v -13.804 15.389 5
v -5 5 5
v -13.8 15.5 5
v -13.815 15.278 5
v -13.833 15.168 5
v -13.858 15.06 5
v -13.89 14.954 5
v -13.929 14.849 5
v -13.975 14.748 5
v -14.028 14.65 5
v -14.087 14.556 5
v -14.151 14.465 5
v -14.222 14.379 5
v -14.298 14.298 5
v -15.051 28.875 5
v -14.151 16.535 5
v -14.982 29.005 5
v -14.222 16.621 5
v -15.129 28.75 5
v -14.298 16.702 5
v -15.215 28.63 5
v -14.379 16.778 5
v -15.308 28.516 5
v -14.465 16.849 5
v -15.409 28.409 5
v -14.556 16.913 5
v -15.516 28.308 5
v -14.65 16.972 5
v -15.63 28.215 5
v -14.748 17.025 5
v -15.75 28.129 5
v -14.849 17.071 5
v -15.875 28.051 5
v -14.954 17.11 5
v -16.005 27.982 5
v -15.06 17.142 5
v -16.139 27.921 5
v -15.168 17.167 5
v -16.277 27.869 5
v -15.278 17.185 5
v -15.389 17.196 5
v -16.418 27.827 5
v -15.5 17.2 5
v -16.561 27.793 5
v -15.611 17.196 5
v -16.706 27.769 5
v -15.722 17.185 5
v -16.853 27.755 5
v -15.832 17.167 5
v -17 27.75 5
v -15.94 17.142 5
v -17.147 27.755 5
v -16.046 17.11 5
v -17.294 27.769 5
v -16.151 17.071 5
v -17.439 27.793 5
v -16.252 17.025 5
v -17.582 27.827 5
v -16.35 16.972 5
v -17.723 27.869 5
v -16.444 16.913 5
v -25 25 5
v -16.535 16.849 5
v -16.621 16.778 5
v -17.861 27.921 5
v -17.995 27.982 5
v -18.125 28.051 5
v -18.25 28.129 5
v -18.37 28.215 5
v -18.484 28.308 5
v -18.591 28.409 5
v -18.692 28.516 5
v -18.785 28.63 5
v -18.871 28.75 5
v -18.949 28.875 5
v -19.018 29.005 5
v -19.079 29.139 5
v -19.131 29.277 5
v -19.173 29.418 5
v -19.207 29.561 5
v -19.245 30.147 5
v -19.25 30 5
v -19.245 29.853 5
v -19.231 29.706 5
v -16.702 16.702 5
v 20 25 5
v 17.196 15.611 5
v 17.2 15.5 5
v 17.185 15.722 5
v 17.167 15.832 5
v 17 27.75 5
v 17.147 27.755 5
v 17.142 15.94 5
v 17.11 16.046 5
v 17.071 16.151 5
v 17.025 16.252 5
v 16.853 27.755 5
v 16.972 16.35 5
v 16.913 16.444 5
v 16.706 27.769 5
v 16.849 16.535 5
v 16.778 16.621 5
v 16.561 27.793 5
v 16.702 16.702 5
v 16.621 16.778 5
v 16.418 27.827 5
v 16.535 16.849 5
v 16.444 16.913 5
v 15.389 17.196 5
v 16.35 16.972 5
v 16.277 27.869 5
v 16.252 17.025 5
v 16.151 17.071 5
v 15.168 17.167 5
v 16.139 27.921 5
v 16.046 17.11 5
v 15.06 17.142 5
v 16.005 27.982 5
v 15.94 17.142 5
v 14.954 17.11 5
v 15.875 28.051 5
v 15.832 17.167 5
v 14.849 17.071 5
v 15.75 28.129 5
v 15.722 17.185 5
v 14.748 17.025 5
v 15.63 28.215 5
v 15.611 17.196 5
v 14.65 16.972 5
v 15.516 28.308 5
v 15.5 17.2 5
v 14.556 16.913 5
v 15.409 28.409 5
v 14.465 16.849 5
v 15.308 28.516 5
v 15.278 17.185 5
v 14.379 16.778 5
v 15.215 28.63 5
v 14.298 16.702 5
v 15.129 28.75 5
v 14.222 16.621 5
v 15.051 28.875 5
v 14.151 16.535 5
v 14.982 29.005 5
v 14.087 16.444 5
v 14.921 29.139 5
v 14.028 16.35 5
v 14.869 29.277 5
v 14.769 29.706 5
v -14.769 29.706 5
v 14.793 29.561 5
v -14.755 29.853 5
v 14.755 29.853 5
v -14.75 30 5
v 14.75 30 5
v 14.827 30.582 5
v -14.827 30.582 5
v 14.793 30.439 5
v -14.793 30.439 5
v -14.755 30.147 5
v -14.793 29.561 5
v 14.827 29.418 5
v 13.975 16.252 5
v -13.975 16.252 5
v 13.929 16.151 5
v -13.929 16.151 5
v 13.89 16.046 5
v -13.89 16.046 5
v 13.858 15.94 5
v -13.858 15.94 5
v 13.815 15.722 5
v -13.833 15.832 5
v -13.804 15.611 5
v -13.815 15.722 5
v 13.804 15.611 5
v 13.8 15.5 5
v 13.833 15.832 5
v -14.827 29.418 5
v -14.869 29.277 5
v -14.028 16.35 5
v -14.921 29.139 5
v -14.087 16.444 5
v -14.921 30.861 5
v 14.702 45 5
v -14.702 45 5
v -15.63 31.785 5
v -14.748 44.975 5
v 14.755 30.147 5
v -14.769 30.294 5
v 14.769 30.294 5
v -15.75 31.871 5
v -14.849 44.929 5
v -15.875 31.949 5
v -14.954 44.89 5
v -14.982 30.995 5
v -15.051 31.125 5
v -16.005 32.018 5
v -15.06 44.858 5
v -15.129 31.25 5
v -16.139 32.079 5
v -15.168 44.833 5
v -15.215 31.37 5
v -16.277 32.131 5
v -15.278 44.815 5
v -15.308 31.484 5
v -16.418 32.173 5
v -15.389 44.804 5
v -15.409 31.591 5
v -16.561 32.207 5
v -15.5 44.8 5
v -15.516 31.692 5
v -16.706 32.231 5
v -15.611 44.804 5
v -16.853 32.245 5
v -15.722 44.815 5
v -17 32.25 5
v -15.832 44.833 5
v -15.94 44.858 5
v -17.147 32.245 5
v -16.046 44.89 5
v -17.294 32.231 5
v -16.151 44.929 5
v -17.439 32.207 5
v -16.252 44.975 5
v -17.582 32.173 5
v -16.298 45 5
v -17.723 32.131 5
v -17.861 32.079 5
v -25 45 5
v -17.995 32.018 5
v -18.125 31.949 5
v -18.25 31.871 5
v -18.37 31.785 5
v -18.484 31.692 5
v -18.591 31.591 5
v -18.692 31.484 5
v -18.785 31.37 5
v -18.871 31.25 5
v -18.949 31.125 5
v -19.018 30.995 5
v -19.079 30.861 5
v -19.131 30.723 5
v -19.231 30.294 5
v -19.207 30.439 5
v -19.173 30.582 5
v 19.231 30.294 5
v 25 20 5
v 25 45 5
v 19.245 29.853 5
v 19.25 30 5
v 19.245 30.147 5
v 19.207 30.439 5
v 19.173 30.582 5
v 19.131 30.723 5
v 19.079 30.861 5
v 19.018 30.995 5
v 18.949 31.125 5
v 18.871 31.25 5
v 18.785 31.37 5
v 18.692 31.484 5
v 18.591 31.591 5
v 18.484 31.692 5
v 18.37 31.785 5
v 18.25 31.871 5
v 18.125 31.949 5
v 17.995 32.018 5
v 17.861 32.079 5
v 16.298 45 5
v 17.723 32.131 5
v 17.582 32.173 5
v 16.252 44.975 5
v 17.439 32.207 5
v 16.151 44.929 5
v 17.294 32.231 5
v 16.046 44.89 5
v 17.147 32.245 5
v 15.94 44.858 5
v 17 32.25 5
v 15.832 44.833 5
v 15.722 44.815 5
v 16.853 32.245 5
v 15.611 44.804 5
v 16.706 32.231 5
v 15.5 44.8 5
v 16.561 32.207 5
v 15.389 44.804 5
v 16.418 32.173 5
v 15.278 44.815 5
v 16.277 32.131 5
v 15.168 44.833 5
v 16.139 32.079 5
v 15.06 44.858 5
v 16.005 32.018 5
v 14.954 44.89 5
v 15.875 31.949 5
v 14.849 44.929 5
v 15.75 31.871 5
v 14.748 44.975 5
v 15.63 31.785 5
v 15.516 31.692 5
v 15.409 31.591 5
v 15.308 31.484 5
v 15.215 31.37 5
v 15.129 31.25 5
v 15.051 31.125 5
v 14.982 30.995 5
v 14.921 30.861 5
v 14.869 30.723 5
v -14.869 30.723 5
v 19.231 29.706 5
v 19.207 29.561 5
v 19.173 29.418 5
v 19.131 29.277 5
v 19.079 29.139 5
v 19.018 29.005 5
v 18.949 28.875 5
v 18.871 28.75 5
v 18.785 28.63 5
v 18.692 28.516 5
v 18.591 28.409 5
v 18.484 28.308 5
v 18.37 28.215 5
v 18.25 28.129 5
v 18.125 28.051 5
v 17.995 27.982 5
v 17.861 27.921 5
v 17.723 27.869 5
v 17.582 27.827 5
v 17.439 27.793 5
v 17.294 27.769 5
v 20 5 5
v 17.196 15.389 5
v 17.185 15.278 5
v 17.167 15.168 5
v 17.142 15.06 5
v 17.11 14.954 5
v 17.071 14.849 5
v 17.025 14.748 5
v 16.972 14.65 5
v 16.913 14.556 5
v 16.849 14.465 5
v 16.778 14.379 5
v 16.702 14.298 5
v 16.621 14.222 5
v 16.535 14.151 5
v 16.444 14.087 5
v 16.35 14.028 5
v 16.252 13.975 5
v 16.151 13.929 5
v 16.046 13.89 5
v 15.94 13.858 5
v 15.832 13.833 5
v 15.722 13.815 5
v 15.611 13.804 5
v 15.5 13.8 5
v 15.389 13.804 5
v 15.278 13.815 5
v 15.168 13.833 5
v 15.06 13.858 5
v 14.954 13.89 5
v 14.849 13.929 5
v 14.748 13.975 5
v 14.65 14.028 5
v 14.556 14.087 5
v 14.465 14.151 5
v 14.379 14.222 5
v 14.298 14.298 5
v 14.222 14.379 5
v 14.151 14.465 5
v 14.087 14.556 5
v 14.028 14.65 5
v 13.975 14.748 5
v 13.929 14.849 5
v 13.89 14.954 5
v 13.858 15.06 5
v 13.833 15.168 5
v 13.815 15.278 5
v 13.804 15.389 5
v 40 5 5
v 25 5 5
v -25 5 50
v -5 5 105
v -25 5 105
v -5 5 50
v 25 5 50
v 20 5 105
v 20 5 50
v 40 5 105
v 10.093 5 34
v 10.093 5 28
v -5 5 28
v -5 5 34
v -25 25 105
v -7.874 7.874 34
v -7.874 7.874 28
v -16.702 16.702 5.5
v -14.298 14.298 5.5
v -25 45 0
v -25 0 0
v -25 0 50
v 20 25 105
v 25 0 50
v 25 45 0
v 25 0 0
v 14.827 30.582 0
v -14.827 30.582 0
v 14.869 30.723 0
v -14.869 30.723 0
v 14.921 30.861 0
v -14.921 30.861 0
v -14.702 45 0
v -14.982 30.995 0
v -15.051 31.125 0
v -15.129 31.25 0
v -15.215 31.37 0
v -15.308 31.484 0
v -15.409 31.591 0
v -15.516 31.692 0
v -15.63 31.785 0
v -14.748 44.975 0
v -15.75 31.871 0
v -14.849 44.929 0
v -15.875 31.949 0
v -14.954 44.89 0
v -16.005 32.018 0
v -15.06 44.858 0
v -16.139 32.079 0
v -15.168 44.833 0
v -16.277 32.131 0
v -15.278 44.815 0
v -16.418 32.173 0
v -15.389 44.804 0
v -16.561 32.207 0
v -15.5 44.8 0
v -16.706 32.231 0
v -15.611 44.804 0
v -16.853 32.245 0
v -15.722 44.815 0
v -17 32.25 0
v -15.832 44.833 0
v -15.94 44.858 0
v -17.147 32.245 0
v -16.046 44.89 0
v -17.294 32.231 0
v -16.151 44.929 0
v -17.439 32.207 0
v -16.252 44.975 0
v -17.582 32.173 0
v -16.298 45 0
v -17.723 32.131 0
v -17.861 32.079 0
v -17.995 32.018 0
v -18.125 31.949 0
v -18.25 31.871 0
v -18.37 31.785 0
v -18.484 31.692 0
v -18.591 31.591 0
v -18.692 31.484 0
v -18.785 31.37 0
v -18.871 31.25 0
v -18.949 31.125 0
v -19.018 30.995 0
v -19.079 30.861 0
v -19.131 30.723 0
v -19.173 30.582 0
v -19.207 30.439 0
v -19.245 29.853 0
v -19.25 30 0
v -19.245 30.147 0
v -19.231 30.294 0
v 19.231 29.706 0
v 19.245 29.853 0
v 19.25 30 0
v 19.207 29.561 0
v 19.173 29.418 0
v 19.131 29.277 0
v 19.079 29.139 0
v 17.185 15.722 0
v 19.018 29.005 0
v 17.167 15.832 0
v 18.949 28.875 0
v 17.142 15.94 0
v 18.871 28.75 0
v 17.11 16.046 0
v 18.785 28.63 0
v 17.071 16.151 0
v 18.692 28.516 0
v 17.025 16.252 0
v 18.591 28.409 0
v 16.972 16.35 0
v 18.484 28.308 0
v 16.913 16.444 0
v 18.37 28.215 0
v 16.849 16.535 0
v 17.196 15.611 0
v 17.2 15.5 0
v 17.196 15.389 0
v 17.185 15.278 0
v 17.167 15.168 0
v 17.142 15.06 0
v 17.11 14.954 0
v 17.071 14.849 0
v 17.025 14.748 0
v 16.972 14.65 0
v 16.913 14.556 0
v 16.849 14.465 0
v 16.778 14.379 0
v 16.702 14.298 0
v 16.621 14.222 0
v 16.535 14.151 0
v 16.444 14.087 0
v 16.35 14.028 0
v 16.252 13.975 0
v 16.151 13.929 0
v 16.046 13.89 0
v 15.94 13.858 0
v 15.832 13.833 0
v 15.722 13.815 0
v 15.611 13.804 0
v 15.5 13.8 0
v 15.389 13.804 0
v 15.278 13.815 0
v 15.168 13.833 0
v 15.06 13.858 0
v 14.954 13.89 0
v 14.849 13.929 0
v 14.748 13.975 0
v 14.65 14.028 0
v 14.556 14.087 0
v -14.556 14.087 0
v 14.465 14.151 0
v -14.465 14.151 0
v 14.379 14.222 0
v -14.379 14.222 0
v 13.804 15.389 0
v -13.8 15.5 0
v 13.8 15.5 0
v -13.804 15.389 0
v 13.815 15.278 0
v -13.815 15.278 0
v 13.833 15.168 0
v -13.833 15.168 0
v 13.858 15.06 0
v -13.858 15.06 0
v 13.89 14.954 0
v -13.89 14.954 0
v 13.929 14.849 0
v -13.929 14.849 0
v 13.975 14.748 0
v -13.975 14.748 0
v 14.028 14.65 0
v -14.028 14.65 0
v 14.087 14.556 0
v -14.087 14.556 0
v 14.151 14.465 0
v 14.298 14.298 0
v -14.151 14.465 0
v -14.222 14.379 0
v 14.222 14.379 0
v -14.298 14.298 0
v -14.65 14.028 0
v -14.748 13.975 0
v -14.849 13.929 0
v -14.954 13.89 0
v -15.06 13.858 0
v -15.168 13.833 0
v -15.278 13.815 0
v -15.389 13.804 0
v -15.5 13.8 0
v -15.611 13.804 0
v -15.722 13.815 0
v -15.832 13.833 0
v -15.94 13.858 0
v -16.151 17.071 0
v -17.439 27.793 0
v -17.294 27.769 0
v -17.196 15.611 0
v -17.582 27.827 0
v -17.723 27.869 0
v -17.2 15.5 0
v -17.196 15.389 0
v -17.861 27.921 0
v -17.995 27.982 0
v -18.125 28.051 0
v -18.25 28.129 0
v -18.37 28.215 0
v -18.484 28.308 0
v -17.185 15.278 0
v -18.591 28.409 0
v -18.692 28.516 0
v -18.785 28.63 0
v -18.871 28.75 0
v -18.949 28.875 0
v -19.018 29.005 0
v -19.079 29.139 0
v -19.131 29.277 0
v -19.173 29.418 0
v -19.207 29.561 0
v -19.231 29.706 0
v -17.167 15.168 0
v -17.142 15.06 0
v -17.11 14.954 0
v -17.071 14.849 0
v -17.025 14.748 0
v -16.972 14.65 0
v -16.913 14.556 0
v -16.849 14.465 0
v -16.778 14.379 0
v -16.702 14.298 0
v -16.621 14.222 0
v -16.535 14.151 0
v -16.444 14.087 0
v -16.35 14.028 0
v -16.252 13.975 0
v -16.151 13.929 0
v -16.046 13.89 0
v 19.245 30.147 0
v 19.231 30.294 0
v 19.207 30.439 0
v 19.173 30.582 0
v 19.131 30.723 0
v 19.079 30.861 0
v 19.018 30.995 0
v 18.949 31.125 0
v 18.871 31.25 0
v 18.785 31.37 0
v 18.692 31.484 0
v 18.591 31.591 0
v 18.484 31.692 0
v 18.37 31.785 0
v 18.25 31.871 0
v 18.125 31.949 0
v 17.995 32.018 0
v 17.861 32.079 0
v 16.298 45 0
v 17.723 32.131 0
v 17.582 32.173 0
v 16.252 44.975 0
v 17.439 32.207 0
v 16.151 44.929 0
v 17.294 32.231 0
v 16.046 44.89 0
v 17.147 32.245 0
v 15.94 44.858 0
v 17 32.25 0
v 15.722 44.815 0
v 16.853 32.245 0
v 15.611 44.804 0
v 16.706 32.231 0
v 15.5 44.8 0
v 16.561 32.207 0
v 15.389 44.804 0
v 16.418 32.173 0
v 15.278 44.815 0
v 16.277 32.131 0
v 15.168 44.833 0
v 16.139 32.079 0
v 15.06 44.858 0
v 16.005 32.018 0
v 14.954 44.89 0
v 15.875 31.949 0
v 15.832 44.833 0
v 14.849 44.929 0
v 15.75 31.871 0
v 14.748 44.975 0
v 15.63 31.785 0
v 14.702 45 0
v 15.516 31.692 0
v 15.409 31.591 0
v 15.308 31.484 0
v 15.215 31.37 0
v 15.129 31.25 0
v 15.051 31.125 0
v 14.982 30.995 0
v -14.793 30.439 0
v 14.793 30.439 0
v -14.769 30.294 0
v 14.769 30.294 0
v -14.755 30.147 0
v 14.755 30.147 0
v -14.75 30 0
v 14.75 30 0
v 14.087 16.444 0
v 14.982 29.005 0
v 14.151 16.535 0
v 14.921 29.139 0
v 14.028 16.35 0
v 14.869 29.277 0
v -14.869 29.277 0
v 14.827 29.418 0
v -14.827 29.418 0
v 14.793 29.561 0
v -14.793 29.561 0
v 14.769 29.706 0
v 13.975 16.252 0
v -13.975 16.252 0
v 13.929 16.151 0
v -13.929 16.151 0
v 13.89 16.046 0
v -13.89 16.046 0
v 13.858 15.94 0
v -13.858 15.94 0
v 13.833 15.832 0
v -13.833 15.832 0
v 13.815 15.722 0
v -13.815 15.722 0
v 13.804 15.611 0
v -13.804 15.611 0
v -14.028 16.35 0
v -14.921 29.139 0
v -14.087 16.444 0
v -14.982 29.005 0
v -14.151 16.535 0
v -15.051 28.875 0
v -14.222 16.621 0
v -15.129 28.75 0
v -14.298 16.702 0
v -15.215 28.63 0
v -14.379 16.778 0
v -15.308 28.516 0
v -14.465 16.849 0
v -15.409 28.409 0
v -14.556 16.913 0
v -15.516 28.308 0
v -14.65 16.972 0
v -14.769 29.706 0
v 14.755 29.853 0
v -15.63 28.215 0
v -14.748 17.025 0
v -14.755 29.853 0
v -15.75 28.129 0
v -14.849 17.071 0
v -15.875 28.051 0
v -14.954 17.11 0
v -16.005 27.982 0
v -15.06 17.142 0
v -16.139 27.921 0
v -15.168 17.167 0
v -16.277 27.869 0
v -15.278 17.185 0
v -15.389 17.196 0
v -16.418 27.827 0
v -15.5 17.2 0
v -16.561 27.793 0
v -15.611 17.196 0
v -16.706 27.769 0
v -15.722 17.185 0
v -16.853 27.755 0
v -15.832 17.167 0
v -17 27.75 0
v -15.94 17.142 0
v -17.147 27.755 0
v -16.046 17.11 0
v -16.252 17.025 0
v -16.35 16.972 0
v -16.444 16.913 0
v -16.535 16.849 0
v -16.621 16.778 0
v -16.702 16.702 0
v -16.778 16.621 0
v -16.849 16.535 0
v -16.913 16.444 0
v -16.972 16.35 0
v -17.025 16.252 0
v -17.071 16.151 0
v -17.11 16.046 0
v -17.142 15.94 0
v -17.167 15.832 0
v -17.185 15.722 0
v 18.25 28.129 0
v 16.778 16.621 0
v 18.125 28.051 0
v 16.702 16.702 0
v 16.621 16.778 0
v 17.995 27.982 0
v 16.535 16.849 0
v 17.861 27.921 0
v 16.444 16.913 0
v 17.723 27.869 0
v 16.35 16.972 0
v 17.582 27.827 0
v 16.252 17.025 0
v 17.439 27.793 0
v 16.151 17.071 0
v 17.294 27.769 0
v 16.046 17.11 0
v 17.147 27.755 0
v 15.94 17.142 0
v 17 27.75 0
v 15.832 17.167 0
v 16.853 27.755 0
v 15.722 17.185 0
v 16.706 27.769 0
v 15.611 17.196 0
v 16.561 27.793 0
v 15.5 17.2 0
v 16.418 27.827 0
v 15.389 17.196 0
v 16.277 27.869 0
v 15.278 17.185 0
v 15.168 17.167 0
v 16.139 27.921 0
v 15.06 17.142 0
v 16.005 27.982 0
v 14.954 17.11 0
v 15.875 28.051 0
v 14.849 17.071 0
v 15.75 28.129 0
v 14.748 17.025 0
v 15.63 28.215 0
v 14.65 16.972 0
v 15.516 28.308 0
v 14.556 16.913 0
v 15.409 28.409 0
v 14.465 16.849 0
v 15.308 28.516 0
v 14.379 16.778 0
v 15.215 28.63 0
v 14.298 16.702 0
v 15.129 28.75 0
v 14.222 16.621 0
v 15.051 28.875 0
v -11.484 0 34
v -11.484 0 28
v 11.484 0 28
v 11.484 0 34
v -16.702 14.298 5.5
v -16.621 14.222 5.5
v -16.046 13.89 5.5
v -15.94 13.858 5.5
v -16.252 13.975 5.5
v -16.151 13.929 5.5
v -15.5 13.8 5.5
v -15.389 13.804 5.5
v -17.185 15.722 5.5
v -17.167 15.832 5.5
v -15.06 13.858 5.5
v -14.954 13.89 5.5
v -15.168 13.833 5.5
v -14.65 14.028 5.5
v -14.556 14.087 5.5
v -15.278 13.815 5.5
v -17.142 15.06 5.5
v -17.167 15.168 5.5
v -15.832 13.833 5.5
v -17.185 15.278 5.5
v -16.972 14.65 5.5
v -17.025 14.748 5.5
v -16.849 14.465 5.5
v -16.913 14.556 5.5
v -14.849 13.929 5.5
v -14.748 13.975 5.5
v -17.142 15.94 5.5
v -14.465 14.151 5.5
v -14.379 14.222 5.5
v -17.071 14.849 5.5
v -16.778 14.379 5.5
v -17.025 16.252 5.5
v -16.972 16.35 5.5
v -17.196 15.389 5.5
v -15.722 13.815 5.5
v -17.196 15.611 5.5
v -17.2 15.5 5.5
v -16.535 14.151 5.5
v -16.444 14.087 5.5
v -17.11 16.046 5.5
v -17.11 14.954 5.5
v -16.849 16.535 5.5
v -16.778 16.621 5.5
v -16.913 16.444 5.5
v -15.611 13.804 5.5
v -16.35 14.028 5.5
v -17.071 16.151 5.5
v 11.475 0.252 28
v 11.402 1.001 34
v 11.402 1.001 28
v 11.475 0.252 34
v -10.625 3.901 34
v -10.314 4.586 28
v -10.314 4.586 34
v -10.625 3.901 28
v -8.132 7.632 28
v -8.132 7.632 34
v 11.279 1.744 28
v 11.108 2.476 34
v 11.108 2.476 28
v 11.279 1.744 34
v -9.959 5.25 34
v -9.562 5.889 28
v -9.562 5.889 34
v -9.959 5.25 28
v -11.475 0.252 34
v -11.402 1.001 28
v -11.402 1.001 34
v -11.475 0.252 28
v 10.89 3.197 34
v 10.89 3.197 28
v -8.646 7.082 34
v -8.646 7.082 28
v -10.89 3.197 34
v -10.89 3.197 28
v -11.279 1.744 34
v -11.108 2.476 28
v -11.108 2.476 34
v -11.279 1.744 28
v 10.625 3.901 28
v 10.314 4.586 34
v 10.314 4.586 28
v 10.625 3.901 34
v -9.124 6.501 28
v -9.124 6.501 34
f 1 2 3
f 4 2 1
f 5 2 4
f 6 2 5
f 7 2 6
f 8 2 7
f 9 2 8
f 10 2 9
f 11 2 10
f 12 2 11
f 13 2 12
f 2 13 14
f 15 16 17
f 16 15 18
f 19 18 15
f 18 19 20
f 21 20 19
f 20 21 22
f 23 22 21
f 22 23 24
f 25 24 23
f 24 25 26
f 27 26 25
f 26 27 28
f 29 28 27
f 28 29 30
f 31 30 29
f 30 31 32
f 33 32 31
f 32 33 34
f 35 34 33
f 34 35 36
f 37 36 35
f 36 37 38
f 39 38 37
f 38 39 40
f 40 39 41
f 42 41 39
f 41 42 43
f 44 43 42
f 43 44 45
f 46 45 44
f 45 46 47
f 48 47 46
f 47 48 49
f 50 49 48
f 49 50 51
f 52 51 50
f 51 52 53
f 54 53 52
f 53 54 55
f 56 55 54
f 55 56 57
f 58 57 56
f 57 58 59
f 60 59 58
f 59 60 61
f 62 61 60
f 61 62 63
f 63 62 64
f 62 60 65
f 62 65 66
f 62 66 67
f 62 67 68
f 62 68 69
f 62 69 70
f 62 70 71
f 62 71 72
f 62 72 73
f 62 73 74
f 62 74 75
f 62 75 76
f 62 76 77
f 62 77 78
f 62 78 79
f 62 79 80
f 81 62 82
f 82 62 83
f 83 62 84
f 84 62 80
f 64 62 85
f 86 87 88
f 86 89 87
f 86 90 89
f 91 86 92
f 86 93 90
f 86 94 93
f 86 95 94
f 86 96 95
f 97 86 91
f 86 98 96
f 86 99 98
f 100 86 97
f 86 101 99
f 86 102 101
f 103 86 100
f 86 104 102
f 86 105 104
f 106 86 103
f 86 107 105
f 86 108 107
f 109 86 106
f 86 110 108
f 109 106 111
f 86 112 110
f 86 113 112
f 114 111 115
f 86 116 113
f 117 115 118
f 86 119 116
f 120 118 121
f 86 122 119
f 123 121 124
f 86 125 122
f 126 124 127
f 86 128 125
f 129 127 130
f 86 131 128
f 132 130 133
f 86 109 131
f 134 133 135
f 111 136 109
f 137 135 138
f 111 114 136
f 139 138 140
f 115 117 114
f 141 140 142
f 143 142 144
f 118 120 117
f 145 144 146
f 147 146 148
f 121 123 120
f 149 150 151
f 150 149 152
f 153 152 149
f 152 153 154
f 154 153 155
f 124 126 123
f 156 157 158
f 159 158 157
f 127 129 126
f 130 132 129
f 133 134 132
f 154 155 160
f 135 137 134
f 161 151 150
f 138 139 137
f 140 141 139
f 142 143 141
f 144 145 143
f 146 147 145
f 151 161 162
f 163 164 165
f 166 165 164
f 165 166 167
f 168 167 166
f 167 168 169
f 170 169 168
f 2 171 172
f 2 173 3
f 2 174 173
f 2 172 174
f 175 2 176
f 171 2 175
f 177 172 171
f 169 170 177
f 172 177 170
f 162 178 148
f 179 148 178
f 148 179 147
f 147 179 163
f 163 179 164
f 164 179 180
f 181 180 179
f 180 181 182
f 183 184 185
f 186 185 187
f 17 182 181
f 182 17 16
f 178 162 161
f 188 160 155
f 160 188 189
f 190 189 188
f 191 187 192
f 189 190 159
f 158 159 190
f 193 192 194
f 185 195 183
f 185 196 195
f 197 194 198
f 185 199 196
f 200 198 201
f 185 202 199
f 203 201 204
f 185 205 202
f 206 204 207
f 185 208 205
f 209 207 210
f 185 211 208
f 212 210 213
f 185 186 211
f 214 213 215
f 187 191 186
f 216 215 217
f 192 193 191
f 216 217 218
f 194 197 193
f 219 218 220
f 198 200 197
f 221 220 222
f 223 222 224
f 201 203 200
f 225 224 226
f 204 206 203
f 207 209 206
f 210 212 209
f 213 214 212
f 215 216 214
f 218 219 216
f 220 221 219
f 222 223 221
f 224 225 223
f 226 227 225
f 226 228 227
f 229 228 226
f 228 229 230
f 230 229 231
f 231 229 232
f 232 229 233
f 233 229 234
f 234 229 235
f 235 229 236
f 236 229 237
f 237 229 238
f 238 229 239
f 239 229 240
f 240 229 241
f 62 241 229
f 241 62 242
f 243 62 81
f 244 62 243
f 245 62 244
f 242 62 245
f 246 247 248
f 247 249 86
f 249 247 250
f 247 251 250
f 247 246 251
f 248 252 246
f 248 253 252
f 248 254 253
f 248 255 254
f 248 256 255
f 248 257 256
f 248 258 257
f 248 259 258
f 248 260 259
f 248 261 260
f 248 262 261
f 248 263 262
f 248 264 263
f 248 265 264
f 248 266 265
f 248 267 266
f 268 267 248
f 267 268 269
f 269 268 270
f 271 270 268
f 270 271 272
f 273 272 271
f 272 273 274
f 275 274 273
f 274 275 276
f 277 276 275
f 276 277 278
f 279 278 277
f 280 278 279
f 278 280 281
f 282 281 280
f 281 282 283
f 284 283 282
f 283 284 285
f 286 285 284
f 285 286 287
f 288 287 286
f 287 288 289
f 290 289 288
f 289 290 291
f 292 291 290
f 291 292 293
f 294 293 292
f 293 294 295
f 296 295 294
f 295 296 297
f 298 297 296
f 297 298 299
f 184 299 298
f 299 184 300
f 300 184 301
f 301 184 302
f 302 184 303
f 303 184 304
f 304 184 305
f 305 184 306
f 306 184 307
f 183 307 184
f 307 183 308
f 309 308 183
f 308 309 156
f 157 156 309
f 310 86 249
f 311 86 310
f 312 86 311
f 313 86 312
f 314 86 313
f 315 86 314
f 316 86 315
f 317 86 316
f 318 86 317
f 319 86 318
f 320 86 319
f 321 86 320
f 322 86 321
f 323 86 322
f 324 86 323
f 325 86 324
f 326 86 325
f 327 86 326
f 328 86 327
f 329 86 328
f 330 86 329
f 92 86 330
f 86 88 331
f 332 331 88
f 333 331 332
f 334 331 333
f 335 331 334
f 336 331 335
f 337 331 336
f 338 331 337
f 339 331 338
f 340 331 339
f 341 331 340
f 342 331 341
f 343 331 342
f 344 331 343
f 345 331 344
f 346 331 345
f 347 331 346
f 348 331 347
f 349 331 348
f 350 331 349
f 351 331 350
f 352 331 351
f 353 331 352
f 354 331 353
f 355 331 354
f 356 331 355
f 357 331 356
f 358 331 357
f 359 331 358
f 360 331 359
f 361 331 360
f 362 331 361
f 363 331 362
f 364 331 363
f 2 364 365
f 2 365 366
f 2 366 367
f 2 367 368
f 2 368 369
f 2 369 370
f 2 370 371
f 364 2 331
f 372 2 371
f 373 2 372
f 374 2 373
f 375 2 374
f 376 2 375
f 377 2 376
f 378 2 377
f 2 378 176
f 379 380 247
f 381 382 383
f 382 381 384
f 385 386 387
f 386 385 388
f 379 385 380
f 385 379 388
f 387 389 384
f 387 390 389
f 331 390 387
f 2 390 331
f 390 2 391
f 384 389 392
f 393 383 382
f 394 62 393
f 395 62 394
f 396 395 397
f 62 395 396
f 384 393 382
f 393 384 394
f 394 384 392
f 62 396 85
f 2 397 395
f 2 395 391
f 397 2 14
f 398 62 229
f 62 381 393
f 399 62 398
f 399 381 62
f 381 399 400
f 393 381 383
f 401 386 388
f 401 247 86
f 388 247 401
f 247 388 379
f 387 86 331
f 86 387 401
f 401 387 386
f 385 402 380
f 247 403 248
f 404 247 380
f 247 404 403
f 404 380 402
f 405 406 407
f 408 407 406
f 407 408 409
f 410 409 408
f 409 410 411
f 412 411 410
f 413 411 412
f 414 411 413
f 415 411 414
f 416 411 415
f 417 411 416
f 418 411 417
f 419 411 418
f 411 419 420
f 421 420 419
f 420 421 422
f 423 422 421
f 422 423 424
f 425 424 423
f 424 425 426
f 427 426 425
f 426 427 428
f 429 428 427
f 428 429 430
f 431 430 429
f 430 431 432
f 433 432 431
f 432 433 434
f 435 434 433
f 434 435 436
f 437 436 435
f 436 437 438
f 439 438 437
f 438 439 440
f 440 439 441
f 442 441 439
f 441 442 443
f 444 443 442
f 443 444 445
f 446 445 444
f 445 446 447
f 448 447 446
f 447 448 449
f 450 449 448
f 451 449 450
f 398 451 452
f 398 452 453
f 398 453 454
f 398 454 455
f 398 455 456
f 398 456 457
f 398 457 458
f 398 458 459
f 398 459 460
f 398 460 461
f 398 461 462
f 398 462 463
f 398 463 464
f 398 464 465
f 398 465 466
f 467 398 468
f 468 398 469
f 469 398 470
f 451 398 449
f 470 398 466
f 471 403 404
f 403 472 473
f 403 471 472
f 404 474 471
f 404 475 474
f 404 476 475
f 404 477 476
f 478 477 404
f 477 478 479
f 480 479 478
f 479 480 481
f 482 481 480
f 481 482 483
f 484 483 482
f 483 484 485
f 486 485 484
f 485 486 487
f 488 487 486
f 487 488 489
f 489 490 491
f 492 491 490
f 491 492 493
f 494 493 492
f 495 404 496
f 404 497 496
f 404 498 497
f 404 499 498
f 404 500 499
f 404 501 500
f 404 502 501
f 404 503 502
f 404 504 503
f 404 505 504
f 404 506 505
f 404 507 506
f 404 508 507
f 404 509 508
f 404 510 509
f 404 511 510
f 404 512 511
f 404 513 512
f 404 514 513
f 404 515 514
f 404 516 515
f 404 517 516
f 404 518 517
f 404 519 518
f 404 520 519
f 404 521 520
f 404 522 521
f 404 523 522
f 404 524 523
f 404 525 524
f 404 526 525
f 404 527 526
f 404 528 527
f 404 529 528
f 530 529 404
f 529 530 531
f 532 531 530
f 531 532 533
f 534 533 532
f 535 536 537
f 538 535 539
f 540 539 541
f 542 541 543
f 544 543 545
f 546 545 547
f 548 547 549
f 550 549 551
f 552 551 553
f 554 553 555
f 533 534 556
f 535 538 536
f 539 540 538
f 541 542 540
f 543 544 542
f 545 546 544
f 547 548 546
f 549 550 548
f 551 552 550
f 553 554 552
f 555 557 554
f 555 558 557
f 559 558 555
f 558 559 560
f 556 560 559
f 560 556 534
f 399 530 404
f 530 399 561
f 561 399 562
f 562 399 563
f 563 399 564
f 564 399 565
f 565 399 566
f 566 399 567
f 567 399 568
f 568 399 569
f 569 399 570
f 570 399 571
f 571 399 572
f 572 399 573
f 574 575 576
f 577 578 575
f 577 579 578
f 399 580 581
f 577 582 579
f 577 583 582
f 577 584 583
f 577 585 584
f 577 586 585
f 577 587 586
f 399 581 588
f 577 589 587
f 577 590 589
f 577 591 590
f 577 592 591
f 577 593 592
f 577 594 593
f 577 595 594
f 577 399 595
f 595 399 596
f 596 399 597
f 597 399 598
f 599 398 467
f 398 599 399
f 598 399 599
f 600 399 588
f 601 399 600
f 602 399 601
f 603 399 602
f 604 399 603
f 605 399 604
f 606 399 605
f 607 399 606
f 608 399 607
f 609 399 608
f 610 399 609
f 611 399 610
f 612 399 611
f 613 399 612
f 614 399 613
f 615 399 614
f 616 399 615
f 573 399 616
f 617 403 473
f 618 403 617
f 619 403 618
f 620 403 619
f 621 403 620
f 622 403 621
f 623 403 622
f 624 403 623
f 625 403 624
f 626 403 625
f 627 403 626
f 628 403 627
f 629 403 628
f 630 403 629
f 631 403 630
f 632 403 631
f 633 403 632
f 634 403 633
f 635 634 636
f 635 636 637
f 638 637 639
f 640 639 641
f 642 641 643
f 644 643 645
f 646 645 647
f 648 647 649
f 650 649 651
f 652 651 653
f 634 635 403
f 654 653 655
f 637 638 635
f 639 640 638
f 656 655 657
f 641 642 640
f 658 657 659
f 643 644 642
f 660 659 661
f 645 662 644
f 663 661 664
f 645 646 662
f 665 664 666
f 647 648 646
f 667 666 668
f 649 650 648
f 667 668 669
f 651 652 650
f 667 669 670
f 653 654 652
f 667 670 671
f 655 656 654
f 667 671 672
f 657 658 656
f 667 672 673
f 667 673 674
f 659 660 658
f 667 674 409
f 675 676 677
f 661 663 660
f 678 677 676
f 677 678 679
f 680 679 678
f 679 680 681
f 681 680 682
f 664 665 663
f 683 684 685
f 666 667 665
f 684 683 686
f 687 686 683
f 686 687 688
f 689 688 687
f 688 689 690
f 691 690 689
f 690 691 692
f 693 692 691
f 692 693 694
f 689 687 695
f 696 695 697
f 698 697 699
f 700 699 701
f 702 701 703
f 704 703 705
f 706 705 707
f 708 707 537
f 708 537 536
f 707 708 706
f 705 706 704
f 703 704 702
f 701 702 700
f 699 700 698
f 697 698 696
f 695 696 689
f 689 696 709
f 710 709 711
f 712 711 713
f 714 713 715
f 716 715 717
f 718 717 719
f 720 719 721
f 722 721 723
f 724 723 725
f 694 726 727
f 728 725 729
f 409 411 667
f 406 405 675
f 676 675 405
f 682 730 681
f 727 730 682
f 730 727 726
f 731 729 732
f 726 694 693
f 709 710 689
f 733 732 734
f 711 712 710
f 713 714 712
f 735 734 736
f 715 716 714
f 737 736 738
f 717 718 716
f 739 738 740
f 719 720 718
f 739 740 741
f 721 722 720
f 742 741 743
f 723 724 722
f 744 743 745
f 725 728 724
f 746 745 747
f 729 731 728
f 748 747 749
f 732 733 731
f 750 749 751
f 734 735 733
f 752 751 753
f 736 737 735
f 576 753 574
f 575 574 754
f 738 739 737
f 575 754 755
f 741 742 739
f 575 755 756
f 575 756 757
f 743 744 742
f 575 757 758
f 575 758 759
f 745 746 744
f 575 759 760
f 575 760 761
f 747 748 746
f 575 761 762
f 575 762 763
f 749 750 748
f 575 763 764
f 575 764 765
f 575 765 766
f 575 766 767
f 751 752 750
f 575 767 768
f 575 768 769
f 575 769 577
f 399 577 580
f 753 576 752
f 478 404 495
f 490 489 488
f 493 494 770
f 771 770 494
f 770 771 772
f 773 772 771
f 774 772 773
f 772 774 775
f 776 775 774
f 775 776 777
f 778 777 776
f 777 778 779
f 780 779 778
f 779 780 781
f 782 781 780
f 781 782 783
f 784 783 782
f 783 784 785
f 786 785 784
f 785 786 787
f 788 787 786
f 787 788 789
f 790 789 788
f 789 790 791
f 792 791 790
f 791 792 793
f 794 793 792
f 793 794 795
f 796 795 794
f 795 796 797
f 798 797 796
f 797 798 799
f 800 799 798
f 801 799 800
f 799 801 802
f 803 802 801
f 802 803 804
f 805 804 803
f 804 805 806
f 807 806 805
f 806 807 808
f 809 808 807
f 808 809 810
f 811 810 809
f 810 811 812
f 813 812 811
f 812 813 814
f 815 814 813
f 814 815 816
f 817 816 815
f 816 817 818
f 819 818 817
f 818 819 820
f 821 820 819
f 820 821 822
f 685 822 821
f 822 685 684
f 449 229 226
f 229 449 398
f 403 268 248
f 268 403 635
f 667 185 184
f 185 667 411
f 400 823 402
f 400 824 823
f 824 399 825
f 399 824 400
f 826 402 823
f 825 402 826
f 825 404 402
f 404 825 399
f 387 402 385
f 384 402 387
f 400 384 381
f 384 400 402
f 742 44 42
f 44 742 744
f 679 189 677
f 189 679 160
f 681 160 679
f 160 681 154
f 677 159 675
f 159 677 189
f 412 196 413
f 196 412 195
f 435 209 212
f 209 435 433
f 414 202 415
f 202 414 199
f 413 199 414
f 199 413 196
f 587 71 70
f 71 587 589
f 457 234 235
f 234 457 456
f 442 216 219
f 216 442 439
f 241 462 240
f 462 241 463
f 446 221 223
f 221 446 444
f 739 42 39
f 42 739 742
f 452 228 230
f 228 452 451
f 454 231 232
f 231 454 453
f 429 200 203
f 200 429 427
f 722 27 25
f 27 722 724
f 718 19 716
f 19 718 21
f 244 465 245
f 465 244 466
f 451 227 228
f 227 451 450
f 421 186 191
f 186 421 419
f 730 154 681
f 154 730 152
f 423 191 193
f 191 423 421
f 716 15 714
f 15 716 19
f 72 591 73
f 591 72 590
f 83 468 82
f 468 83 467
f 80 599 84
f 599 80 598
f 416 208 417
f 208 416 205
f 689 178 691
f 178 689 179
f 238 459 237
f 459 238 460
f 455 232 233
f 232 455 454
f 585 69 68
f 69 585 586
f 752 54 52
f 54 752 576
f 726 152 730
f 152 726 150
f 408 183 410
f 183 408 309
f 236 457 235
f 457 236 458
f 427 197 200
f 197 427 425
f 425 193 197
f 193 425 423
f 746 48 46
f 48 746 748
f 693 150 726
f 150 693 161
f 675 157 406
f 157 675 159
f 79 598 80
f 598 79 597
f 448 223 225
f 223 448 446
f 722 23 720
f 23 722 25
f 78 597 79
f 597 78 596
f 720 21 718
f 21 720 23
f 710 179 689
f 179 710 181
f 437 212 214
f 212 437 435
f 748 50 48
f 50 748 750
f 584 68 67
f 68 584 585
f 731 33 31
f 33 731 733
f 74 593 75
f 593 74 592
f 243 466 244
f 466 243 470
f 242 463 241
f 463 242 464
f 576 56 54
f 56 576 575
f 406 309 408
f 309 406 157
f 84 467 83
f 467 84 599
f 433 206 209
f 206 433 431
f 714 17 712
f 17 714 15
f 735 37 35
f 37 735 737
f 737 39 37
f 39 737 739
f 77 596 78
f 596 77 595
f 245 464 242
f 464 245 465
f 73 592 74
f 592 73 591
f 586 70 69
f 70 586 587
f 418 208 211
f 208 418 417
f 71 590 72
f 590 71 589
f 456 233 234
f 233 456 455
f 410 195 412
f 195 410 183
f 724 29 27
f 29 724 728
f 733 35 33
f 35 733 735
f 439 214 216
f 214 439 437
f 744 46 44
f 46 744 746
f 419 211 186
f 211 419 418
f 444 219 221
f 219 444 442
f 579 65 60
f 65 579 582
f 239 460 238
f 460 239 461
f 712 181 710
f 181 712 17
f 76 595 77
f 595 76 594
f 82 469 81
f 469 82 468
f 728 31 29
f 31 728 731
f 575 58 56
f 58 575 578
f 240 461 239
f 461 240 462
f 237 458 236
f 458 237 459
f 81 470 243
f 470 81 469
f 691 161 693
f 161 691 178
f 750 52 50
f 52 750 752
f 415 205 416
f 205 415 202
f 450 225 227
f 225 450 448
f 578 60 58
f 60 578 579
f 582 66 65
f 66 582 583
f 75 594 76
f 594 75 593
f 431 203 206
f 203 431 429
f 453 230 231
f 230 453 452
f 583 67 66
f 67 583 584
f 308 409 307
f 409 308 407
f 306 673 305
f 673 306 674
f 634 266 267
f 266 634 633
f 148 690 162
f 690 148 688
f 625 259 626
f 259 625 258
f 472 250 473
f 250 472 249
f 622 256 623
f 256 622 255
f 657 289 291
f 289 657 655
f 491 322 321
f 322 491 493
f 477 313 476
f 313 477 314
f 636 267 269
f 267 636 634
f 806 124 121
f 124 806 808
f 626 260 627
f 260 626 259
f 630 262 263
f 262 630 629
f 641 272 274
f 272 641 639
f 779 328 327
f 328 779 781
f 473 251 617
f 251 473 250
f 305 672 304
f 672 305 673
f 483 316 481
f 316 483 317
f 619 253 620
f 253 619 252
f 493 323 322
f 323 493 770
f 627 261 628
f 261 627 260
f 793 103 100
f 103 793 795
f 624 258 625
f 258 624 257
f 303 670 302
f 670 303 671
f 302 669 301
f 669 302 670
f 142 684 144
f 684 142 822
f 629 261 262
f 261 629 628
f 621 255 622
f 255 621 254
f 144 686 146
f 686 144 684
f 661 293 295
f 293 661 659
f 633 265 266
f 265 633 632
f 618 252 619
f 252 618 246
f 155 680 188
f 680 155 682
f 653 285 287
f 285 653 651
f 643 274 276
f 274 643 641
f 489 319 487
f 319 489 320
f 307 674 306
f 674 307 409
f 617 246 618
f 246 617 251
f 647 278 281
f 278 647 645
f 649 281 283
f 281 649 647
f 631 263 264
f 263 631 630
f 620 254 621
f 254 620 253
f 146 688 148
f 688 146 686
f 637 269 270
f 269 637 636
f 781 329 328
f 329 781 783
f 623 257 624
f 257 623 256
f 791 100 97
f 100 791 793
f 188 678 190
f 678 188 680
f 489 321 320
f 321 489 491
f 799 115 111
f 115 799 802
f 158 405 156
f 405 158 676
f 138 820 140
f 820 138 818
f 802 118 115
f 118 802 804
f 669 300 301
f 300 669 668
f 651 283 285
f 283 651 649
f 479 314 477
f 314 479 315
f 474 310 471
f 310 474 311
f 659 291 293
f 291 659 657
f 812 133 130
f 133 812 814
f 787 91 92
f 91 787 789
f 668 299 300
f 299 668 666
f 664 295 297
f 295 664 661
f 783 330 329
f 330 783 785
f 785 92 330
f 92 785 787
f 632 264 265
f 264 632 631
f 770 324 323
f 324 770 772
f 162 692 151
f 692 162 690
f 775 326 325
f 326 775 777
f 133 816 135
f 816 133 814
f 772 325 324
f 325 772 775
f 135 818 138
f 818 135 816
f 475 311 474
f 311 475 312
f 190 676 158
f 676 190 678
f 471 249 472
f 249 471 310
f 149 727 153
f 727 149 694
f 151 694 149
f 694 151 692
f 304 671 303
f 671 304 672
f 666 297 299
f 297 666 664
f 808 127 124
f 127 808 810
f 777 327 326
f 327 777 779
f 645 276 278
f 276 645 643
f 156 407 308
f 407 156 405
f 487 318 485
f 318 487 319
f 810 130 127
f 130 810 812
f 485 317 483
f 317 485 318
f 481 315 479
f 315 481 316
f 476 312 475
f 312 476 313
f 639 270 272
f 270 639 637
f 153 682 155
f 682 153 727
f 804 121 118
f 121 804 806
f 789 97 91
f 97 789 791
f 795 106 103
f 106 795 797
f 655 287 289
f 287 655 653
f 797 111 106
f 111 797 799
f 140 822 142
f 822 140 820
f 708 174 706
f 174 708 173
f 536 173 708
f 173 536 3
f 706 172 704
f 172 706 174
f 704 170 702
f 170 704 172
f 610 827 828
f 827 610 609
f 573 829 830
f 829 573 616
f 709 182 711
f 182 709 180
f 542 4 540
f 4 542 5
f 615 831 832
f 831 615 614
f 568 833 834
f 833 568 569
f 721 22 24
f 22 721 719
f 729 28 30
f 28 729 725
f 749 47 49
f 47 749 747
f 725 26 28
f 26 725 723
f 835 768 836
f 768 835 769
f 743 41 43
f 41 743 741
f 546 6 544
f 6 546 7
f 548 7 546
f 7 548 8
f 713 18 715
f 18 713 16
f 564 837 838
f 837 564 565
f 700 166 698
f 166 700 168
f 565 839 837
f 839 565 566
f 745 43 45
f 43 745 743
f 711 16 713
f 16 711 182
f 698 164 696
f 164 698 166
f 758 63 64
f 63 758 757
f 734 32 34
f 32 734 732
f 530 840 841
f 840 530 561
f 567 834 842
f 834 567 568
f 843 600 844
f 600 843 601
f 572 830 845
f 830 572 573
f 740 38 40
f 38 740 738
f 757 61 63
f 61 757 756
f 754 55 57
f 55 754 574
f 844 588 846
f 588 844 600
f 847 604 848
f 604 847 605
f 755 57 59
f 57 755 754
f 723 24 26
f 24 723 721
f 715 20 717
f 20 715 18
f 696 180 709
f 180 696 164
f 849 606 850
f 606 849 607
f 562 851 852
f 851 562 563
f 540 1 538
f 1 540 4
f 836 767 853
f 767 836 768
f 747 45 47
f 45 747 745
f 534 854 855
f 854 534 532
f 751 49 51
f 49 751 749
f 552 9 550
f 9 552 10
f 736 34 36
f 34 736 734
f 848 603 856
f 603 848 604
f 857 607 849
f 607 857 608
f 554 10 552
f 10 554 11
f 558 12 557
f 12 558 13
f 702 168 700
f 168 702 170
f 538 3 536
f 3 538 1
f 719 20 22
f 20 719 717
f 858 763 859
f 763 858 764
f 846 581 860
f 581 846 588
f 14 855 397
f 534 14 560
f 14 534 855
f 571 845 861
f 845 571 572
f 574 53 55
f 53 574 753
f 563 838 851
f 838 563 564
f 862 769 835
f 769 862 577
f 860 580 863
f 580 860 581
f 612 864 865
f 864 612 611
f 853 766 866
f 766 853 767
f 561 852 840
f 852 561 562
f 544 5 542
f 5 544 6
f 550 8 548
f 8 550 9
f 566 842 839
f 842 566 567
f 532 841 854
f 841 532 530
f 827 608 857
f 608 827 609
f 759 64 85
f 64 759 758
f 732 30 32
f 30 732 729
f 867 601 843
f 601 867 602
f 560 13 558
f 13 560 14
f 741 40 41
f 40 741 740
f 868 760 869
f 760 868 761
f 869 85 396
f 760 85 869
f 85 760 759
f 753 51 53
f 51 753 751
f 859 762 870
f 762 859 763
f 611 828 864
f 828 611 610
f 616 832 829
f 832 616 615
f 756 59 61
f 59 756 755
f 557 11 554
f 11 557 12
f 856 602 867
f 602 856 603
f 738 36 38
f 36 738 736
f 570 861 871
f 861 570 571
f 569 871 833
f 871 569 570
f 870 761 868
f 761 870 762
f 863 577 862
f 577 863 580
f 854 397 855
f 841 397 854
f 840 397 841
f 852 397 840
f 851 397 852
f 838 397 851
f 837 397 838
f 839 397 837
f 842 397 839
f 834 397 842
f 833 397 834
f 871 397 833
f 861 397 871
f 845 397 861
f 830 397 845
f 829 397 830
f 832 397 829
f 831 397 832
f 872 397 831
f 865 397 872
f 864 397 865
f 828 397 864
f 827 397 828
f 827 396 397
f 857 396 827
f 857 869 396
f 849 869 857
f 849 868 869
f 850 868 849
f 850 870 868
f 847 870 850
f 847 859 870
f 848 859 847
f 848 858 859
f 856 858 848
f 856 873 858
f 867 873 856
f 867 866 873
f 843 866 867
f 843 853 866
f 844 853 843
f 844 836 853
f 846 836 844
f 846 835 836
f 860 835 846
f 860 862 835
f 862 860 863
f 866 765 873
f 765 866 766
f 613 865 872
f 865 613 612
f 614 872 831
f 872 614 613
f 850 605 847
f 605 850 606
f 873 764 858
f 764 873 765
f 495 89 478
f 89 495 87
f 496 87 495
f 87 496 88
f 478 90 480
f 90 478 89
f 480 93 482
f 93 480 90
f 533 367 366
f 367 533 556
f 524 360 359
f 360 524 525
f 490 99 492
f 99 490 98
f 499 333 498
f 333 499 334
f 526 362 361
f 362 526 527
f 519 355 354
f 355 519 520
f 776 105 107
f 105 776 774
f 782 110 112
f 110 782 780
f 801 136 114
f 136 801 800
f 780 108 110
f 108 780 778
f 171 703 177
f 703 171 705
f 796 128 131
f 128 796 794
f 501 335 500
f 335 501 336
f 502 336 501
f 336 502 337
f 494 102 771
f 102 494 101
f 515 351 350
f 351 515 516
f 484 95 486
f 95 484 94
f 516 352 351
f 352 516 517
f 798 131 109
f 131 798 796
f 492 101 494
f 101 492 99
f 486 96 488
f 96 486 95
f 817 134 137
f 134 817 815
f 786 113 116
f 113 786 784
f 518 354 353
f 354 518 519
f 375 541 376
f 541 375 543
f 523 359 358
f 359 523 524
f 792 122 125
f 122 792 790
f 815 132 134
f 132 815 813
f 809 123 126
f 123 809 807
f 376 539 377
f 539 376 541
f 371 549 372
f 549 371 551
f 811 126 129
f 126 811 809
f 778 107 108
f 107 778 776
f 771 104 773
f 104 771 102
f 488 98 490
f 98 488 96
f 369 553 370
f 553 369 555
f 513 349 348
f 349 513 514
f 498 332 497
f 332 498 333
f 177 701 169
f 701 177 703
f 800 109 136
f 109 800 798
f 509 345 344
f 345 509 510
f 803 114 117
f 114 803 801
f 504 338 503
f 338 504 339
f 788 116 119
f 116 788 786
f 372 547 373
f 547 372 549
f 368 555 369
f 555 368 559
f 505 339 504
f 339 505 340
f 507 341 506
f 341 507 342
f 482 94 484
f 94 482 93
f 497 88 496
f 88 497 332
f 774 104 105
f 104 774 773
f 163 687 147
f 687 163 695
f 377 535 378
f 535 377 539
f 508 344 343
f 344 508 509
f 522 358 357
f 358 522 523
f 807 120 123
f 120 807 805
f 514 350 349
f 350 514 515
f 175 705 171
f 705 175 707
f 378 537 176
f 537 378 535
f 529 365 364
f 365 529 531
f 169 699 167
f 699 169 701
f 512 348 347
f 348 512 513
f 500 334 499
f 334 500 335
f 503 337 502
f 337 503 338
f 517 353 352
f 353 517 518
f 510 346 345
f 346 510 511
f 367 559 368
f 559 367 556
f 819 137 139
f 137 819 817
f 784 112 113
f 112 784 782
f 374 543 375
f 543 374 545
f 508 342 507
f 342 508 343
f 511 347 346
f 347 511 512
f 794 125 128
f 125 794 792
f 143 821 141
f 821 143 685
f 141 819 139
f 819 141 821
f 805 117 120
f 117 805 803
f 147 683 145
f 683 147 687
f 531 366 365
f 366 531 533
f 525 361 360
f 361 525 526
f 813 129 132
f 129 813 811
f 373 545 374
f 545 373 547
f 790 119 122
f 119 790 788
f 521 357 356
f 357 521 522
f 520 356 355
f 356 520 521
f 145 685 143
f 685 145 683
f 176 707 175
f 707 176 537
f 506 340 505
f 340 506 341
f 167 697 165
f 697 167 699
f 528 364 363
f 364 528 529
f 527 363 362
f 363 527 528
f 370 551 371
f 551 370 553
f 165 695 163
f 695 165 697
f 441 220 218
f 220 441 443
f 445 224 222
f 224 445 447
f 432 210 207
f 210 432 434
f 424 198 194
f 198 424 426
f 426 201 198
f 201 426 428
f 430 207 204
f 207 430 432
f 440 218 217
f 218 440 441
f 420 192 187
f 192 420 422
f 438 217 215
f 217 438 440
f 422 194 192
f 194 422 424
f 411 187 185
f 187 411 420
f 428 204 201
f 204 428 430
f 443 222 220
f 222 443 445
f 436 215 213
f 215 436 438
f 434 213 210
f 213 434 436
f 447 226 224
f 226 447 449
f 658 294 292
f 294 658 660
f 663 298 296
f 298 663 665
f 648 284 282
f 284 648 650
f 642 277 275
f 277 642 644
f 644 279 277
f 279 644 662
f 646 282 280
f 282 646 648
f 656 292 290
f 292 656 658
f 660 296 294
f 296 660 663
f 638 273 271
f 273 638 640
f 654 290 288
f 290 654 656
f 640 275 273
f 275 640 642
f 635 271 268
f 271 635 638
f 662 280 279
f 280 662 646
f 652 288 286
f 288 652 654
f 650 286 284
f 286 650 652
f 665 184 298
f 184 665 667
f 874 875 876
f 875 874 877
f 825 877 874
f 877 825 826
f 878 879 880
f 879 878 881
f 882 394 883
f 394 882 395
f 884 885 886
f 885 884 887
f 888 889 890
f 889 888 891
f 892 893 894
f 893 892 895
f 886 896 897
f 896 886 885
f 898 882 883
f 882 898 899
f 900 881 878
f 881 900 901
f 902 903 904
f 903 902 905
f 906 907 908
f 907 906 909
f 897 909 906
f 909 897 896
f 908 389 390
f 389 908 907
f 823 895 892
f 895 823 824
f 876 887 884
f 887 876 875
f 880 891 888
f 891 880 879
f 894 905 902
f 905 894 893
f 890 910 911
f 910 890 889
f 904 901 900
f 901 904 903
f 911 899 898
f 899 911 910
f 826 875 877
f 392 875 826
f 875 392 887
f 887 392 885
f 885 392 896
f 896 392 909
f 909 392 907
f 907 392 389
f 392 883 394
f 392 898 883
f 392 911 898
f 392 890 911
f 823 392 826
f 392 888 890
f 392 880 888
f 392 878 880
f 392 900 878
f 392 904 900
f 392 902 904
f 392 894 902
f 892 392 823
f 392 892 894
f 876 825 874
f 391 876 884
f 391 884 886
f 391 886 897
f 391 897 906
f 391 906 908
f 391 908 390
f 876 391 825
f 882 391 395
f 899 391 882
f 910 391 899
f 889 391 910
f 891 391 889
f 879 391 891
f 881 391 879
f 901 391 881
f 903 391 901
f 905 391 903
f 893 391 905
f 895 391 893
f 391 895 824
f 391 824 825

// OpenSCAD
// L-shaped mounting bracket for NEMA 17 stepper motor (e.g. syringe pump)
// Print orientation: base plate on bed, vertical plate builds up in +Z

// ---------- Parameters ----------
base_x0      = -25;   // base plate x start
base_x1      = 25;    // base plate x end
base_y0      = 0;     // base plate y start
base_y1      = 45;    // base plate y end
base_z       = 5;     // base plate thickness

motor_x0     = -25;   // motor plate x start
motor_x1     = 25;    // motor plate x end
motor_y      = 5;     // motor plate y end (thickness)
motor_z      = 50;    // motor plate height

boss_hole    = 23;    // motor centring boss hole diameter
boss_x       = 0;     // boss hole x centre
boss_z       = 28;    // boss hole z centre

screw_hole   = 3.4;   // M3 screw hole diameter
screw_n      = 4;     // number of screw holes
screw_pitch  = 31;    // square pattern side length

gusset_t     = 5;     // gusset thickness (X)
gusset_x0    = -25;   // left gusset x start
gusset_x1    = -20;   // left gusset x end
gusset_y     = 20;    // gusset leg along +Y
gusset_z     = 20;    // gusset leg along +Z

eps          = 0.5;   // cutter overshoot past faces
$fn          = 96;    // curve resolution

// ---------- Model ----------
difference() {
    union() {
        // Base plate
        translate([base_x0, base_y0, 0])
            cube([base_x1 - base_x0, base_y1 - base_y0, base_z]);

        // Vertical motor plate
        translate([motor_x0, 0, 0])
            cube([motor_x1 - motor_x0, motor_y, motor_z]);

        // Gussets (right-angle corner at y = 5, z = 5)
        for (sx = [-1, 1])
            translate([sx > 0 ? 20 : gusset_x0, 5, 5])
                linear_extrude([gusset_t * sx > 0 ? 1 : -1])
                    polygon([[0, 0], [gusset_y, 0], [0, gusset_z]]);
    }

    // Base plate through-holes (M4)
    for (x = [-17, 17])
        translate([x, base_y0 + 30, -eps])
            cylinder(d = 4.5, h = base_z + 2 * eps);

    // Motor plate boss hole (along Y)
    translate([boss_x, -eps, boss_z])
        cylinder(d = boss_hole, h = motor_y + 2 * eps);

    // Motor plate screw holes (M3, square pattern)
    for (i = [0 : screw_n - 1]) {
        y = (i - (screw_n - 1) / 2) * screw_pitch;
        for (sx = [-1, 1])
            translate([sx * screw_pitch / 2, y, -eps])
                cylinder(d = screw_hole, h = motor_y + 2 * eps);
    }
}
